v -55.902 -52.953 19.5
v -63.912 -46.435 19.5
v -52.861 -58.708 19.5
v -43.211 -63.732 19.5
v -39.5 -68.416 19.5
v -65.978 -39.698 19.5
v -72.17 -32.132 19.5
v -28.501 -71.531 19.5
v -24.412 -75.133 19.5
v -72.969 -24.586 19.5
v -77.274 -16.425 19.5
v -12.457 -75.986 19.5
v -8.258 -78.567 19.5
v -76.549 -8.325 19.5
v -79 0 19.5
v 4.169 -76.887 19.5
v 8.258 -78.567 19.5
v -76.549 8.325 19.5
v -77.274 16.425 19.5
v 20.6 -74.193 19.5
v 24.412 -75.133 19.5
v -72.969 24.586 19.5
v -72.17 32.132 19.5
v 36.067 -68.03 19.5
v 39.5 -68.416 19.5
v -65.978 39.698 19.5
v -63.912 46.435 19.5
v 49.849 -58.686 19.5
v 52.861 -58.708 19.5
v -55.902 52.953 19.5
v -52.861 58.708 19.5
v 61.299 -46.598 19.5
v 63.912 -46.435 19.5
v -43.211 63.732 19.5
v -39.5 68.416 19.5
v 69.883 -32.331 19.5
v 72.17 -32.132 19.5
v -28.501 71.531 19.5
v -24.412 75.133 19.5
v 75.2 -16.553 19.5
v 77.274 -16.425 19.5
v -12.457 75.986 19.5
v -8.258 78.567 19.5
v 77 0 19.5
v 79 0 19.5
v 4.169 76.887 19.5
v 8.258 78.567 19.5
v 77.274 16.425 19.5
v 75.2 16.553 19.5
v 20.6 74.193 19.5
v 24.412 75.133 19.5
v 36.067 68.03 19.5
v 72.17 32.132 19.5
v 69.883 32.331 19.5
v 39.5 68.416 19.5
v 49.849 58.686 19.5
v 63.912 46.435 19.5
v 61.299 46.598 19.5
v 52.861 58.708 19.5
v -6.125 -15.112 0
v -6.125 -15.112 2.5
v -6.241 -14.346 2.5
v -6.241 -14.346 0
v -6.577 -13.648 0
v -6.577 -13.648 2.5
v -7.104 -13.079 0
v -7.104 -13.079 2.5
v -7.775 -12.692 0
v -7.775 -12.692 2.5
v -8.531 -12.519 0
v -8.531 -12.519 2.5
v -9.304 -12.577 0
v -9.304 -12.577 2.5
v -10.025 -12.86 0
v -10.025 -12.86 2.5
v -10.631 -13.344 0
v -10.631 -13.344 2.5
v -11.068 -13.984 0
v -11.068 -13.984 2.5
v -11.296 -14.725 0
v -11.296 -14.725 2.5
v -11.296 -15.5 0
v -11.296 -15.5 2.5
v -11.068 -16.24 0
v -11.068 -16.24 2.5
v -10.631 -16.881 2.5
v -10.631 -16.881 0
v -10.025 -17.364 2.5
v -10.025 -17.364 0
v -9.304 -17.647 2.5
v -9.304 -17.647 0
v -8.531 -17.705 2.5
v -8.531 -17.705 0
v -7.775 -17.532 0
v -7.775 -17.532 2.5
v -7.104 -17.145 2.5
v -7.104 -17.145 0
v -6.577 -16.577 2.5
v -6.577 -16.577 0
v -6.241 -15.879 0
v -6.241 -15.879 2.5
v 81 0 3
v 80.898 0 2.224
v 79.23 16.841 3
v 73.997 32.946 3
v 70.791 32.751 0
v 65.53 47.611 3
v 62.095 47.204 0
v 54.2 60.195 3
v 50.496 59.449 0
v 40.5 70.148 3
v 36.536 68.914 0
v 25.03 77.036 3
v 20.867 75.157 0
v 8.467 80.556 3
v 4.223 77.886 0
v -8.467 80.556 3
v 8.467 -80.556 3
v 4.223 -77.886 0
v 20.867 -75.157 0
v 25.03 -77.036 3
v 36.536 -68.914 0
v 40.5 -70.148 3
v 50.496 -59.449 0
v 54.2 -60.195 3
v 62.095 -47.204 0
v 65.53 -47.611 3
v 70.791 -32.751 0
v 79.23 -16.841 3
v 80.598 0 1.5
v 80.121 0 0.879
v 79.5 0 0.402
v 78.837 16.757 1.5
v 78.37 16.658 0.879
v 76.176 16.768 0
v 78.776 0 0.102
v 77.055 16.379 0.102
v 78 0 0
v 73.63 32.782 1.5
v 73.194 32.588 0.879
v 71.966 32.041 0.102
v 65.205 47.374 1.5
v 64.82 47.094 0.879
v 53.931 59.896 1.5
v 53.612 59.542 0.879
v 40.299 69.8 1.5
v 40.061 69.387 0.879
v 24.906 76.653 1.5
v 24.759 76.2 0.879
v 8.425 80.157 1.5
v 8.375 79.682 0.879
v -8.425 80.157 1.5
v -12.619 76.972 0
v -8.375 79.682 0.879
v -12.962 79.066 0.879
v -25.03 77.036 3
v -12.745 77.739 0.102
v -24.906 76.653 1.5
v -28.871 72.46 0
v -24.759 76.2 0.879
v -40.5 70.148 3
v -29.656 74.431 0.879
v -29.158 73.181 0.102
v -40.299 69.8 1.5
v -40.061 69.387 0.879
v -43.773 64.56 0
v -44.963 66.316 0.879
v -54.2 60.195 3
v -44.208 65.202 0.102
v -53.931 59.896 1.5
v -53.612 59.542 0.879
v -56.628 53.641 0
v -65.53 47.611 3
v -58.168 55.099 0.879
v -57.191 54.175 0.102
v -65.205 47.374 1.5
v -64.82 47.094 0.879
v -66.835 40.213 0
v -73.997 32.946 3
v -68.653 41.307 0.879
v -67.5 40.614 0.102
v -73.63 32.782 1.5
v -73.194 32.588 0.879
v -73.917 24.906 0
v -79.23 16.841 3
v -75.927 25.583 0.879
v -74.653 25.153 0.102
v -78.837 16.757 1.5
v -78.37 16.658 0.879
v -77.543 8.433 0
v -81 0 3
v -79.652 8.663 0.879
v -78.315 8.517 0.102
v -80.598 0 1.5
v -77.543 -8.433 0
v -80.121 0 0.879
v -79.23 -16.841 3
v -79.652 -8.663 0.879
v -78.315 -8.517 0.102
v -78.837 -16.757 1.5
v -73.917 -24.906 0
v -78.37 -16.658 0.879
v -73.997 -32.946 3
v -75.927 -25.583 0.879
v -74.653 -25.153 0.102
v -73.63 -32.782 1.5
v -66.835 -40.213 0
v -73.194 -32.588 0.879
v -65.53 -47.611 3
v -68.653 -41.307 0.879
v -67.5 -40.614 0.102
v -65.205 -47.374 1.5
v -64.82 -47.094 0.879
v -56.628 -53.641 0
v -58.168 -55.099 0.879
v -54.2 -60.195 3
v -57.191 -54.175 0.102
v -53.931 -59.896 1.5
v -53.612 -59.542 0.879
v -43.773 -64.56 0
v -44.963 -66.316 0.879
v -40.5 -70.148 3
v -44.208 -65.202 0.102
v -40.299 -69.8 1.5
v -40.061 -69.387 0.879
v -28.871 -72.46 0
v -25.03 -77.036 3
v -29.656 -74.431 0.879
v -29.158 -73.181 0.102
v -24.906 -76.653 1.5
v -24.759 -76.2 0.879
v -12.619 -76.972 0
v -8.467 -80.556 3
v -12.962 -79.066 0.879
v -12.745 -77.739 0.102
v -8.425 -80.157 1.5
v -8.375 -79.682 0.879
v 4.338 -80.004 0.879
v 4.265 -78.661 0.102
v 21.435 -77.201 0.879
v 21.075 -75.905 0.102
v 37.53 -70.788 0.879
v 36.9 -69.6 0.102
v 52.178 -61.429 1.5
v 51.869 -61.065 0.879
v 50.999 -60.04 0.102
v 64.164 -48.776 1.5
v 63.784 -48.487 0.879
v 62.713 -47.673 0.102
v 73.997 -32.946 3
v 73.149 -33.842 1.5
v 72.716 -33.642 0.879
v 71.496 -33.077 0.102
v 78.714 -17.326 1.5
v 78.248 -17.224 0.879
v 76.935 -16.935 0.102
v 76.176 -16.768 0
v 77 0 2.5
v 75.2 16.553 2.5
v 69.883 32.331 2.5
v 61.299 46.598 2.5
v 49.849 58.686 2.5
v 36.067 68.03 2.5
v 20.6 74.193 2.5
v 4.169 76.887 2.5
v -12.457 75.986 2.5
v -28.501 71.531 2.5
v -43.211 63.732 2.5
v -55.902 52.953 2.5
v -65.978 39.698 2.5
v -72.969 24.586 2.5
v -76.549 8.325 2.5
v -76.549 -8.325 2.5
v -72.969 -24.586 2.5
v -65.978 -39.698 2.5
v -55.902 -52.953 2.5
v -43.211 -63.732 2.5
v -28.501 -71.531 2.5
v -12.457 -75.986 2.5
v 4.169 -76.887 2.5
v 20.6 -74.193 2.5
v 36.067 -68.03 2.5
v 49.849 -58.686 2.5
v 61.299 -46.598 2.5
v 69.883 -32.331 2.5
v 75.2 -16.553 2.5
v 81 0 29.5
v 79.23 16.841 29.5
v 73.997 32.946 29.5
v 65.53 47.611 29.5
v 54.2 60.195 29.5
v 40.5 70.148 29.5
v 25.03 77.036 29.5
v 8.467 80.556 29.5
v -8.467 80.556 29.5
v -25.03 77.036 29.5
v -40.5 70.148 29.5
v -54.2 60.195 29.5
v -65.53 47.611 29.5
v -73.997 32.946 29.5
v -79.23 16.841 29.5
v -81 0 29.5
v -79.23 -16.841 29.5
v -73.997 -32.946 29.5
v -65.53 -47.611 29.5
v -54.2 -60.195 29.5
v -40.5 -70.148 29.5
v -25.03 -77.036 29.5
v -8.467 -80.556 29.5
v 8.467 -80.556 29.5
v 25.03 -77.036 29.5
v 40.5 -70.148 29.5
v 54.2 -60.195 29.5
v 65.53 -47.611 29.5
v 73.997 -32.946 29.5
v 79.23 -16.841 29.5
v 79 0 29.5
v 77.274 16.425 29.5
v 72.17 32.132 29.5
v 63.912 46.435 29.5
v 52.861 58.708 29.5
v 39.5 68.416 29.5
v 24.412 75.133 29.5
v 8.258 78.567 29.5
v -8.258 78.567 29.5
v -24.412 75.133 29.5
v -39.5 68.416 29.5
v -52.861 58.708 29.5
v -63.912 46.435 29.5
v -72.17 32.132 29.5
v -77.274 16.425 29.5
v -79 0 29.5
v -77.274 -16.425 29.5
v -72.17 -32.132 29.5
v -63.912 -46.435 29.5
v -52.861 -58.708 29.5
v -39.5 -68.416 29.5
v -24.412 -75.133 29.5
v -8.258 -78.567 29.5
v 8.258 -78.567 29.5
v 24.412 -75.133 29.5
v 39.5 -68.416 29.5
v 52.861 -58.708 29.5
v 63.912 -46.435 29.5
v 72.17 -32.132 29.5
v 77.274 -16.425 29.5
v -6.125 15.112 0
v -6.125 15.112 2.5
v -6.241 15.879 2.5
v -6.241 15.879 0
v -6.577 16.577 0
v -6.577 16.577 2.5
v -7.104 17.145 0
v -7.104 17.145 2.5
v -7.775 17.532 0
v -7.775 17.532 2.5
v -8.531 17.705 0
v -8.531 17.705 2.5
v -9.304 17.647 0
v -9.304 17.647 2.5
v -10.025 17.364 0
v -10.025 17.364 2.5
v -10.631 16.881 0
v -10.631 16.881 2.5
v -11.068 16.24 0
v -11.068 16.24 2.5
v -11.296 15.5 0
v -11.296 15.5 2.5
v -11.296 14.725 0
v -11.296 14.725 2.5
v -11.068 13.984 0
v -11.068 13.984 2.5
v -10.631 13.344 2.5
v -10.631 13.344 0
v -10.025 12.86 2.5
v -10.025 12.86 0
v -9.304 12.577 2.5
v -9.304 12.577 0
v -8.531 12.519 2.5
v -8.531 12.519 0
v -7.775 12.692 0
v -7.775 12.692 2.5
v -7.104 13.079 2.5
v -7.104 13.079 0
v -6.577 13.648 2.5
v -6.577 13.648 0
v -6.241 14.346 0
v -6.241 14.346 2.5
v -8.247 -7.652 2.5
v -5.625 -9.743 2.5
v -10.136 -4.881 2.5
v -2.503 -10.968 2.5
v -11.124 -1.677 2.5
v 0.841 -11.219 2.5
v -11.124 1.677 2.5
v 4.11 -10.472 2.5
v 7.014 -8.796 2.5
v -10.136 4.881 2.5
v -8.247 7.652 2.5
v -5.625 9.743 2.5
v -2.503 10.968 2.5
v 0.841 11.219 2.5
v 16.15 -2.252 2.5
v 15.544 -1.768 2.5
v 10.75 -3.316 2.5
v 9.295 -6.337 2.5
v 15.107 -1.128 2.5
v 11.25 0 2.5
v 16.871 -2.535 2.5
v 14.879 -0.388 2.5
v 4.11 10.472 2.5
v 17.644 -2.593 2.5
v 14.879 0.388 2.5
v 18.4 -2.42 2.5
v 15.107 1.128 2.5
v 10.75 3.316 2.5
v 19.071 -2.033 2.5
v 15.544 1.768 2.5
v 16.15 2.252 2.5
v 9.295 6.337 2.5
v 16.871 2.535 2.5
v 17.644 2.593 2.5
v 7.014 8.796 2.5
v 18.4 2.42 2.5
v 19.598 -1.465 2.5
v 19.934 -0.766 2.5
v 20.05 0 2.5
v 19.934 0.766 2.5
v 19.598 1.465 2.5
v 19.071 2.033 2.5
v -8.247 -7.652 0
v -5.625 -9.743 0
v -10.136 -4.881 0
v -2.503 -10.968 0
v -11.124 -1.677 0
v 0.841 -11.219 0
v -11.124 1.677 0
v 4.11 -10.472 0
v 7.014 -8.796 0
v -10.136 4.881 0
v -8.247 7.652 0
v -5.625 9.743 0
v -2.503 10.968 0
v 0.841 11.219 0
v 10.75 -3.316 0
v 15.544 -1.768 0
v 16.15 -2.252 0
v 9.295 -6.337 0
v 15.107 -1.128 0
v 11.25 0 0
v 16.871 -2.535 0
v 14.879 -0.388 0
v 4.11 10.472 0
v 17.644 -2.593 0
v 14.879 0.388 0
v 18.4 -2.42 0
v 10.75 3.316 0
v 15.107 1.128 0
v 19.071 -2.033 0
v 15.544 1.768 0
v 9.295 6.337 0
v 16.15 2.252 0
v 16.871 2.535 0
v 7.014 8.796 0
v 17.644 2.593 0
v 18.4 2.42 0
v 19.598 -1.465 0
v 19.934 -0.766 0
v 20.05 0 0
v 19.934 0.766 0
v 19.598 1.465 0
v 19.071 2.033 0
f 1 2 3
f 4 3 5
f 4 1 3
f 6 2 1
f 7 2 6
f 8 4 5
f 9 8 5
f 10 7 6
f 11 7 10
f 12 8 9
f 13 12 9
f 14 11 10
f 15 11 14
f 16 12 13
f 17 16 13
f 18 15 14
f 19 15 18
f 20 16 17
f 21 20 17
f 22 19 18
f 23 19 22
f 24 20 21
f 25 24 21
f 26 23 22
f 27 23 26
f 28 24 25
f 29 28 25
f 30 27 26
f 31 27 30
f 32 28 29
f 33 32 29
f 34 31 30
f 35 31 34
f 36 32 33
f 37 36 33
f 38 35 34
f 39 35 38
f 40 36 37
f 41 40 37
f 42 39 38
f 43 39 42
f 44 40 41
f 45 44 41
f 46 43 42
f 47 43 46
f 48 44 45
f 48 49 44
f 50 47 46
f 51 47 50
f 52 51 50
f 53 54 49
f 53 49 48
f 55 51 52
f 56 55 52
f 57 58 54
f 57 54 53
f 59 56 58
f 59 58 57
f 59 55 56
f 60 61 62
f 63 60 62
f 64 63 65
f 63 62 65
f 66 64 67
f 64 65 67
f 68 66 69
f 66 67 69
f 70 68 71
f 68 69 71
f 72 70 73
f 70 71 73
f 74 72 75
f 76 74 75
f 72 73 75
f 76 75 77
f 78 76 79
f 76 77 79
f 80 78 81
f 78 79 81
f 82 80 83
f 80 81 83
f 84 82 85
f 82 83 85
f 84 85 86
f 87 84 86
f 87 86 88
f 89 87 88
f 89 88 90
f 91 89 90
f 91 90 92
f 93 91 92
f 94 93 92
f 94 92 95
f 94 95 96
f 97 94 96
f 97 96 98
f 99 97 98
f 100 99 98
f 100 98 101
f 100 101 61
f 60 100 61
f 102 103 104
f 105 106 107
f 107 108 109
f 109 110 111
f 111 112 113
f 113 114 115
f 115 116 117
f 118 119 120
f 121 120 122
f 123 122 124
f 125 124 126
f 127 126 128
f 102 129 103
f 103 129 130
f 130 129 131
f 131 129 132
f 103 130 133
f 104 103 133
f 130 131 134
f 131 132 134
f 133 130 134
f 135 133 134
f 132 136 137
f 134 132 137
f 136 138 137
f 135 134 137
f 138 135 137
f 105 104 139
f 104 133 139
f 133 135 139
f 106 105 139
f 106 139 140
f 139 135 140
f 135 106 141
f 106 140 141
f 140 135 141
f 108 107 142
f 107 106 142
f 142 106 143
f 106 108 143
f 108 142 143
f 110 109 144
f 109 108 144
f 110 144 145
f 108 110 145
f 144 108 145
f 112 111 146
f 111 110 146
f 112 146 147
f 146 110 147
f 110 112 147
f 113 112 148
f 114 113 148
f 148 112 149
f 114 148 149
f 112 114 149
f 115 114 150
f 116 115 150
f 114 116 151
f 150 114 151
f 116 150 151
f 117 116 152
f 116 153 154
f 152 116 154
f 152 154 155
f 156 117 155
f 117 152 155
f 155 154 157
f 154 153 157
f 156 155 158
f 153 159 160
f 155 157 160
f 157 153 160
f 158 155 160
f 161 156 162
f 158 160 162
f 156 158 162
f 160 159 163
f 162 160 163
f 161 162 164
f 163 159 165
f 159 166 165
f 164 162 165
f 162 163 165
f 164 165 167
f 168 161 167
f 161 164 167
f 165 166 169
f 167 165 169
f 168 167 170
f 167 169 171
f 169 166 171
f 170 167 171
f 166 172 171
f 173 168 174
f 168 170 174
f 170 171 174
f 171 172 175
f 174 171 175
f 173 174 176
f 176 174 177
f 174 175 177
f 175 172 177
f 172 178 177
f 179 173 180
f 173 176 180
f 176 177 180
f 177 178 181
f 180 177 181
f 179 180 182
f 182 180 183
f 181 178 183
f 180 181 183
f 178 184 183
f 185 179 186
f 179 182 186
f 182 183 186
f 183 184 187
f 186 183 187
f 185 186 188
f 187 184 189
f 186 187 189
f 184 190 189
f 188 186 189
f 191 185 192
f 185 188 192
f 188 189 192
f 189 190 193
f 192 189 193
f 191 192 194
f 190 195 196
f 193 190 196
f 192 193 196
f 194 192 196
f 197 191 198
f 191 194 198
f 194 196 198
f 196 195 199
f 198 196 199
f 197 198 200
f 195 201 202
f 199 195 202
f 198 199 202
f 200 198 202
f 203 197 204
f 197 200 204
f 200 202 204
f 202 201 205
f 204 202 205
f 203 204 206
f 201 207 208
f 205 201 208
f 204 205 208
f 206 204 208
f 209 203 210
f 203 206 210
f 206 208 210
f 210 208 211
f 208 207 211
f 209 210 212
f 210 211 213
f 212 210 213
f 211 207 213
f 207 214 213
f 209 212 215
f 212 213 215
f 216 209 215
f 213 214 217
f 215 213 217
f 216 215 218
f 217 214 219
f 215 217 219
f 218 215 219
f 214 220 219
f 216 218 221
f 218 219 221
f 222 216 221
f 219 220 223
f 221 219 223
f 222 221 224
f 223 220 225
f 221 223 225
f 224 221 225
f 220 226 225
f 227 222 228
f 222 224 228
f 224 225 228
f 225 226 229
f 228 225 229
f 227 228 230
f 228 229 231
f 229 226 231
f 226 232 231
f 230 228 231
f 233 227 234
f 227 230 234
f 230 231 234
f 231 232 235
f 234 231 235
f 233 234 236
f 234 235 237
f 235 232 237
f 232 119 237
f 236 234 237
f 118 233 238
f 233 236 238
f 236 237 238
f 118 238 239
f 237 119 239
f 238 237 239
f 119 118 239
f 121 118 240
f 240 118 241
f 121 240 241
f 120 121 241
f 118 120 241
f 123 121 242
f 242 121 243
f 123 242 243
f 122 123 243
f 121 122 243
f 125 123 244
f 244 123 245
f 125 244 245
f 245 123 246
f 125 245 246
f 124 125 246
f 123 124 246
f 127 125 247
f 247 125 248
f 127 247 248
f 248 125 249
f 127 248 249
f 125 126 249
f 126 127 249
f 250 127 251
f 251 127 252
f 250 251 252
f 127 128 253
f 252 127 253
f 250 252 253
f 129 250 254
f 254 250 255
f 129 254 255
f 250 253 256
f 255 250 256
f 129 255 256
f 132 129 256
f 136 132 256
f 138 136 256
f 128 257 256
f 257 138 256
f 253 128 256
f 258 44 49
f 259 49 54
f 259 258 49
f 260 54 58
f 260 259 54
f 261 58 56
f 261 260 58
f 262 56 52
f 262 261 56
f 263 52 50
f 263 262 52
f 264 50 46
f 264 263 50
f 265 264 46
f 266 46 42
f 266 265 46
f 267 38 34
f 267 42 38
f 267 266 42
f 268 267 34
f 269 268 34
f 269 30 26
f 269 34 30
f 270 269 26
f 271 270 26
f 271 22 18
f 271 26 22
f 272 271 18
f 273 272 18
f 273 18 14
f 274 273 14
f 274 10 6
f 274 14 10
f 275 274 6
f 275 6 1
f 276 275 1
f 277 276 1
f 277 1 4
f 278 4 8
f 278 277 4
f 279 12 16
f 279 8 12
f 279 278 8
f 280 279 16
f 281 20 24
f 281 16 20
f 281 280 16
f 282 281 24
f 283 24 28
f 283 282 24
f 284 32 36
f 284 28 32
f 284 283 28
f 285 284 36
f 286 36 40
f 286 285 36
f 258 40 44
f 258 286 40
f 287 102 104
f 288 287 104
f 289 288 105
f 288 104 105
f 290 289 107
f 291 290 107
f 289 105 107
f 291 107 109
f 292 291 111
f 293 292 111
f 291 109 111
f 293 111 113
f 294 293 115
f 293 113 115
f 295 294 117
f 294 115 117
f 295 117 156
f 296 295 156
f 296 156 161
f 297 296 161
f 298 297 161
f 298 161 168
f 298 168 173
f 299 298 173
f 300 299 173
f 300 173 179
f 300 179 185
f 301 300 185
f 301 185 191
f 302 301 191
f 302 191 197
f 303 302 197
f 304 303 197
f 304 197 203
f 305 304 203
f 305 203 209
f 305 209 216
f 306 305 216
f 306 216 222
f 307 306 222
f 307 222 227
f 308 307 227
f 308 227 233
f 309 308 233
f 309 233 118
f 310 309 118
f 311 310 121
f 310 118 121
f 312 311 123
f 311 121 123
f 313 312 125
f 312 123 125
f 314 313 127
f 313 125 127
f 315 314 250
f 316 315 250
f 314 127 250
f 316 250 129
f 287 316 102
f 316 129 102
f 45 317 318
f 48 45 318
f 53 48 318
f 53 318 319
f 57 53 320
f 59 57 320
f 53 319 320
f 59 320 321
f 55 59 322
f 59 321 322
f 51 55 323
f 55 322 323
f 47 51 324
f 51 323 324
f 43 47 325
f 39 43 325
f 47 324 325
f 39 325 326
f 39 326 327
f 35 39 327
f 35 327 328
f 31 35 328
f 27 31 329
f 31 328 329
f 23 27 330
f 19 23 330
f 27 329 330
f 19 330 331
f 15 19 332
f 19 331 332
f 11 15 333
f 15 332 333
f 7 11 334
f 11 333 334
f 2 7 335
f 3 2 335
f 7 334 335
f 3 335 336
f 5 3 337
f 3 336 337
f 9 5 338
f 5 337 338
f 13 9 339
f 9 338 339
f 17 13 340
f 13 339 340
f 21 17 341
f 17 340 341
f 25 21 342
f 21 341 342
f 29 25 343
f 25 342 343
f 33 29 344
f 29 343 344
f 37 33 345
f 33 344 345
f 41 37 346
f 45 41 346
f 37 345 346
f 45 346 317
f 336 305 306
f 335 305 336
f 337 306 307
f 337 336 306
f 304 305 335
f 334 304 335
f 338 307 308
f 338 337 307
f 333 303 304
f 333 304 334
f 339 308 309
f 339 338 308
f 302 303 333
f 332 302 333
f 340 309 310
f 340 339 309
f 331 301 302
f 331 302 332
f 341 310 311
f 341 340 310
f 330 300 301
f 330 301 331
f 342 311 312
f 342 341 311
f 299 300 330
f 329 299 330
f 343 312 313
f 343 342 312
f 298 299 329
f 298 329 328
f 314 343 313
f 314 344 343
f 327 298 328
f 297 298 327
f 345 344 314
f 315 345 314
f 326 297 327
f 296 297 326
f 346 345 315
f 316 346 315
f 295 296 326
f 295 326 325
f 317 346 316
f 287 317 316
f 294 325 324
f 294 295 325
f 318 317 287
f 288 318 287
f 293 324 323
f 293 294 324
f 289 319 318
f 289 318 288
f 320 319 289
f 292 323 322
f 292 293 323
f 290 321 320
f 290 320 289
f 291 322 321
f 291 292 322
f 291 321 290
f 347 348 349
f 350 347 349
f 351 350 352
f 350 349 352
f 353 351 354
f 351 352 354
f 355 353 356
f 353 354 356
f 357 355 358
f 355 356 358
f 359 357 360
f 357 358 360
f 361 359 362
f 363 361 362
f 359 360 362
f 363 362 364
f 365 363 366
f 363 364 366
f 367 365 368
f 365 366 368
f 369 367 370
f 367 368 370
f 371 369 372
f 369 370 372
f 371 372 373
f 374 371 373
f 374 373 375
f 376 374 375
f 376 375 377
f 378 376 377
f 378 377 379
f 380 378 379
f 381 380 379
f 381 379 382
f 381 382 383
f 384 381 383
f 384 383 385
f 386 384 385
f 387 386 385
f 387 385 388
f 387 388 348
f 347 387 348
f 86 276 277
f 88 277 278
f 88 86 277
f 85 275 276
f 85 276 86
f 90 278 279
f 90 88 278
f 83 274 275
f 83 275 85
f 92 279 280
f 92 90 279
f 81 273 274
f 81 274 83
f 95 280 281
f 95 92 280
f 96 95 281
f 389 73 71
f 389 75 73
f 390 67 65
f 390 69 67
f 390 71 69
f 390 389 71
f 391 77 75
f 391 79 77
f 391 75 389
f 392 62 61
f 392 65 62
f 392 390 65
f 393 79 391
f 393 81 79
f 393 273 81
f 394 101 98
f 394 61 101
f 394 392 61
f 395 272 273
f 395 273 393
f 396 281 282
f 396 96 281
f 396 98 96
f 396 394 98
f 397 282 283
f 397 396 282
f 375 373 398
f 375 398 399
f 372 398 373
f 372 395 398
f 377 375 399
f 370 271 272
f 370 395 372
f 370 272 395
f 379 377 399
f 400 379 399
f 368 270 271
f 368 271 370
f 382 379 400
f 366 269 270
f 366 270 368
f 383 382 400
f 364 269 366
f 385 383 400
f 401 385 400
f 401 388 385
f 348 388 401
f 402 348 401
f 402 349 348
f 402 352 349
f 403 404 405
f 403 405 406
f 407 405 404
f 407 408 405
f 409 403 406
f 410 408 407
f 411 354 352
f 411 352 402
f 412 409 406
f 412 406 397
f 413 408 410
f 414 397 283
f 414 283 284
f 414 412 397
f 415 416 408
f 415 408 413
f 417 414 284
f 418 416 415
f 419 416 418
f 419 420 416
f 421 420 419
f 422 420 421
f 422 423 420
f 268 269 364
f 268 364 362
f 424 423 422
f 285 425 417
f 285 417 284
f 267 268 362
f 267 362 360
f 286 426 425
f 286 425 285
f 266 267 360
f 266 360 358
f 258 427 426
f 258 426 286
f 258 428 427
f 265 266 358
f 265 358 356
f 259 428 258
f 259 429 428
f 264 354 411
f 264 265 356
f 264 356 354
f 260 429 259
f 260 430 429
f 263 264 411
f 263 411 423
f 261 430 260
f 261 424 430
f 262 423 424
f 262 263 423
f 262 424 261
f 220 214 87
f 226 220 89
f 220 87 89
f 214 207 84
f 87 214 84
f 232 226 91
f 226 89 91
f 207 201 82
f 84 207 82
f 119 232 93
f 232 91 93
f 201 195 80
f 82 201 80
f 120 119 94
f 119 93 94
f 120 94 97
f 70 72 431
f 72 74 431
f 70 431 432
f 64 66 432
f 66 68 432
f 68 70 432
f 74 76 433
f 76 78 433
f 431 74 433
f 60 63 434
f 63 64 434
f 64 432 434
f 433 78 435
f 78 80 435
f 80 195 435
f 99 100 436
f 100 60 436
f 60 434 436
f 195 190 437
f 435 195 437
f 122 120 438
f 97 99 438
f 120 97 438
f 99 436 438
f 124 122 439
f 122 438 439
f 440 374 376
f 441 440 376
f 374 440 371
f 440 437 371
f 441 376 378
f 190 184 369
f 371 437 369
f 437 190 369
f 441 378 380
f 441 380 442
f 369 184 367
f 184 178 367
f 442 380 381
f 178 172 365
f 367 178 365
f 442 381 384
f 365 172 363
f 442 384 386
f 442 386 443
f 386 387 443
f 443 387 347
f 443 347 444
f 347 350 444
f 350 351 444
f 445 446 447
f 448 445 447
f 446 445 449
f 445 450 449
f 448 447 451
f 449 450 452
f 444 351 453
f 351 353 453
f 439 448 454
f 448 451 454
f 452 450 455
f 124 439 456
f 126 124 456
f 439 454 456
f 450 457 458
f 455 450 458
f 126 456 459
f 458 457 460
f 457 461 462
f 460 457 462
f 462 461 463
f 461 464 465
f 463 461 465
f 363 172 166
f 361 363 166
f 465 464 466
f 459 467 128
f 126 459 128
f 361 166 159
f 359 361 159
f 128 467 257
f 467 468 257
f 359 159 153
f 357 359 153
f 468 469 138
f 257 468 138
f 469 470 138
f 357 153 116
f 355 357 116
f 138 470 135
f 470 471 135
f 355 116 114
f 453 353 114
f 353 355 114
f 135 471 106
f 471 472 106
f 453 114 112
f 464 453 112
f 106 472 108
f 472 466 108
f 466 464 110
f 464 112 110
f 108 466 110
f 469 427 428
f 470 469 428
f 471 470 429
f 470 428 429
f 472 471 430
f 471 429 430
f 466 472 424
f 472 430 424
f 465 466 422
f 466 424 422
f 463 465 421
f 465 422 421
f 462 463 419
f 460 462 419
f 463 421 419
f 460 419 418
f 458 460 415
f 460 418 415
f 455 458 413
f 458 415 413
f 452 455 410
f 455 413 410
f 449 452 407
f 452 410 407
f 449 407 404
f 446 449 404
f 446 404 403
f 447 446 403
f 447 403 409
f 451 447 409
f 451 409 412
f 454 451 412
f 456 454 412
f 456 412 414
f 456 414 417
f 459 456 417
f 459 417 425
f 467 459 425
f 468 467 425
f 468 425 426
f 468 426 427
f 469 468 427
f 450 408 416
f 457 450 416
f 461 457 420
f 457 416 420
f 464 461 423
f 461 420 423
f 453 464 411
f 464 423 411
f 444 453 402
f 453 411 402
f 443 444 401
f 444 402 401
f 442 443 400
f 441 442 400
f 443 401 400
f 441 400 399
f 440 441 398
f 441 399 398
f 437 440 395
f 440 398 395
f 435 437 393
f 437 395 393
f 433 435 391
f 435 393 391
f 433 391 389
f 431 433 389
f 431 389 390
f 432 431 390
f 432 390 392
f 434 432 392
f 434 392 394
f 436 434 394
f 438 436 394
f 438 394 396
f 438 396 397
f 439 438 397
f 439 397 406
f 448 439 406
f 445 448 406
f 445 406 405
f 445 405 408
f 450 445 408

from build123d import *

# Parameters (mm, degrees)
SKETCH1_R           = 81
BOSS_EXTRUDE1_DEPTH = 2.5
SKETCH2_R           = 11.25
CUT_EXTRUDE1_DEPTH  = 3.5
SKETCH3_R           = 2.6
CUT_EXTRUDE2_DEPTH  = 3.5
SKETCH4_R           = 81
SKETCH4_R_2         = 77
BOSS_EXTRUDE2_DEPTH = 27
SKETCH5_R           = 79
CUT_EXTRUDE3_DEPTH  = 10
FILLET1_R           = 3


with BuildPart() as part:
    # Sketch1 → Boss-Extrude1 (new body)
    with BuildSketch(Plane.XY):
        Circle(SKETCH1_R)
    extrude(amount=BOSS_EXTRUDE1_DEPTH)

    # Sketch2 → Cut-Extrude1 (cut, through all)
    with BuildSketch(Plane.XY.offset(2.5)):
        Circle(SKETCH2_R)
    extrude(amount=-CUT_EXTRUDE1_DEPTH, mode=Mode.SUBTRACT)

    # Sketch3 → Cut-Extrude2 (cut, through all)
    with BuildSketch(Plane.XY.offset(2.5)):
        with Locations((17.45, 0)):
            Circle(SKETCH3_R)
        with Locations((-8.725, 15.112143296)):
            Circle(SKETCH3_R)
        with Locations((-8.725, -15.112143296)):
            Circle(SKETCH3_R)
    extrude(amount=-CUT_EXTRUDE2_DEPTH, mode=Mode.SUBTRACT)

    # Sketch4 → Boss-Extrude2 (add)
    with BuildSketch(Plane.XY.offset(2.5)):
        Circle(SKETCH4_R)
        Circle(SKETCH4_R_2, mode=Mode.SUBTRACT)
    extrude(amount=BOSS_EXTRUDE2_DEPTH)

    # Sketch5 → Cut-Extrude3 (cut)
    with BuildSketch(Plane.XY.offset(29.5)):
        Circle(SKETCH5_R)
    extrude(amount=-CUT_EXTRUDE3_DEPTH, mode=Mode.SUBTRACT)

    # Fillet1
    fillet1_edges = [part.edges().sort_by_distance(p)[0] for p in [
        (-81, 0, 0),
    ]]
    fillet(fillet1_edges, radius=FILLET1_R)


solid = part.part
